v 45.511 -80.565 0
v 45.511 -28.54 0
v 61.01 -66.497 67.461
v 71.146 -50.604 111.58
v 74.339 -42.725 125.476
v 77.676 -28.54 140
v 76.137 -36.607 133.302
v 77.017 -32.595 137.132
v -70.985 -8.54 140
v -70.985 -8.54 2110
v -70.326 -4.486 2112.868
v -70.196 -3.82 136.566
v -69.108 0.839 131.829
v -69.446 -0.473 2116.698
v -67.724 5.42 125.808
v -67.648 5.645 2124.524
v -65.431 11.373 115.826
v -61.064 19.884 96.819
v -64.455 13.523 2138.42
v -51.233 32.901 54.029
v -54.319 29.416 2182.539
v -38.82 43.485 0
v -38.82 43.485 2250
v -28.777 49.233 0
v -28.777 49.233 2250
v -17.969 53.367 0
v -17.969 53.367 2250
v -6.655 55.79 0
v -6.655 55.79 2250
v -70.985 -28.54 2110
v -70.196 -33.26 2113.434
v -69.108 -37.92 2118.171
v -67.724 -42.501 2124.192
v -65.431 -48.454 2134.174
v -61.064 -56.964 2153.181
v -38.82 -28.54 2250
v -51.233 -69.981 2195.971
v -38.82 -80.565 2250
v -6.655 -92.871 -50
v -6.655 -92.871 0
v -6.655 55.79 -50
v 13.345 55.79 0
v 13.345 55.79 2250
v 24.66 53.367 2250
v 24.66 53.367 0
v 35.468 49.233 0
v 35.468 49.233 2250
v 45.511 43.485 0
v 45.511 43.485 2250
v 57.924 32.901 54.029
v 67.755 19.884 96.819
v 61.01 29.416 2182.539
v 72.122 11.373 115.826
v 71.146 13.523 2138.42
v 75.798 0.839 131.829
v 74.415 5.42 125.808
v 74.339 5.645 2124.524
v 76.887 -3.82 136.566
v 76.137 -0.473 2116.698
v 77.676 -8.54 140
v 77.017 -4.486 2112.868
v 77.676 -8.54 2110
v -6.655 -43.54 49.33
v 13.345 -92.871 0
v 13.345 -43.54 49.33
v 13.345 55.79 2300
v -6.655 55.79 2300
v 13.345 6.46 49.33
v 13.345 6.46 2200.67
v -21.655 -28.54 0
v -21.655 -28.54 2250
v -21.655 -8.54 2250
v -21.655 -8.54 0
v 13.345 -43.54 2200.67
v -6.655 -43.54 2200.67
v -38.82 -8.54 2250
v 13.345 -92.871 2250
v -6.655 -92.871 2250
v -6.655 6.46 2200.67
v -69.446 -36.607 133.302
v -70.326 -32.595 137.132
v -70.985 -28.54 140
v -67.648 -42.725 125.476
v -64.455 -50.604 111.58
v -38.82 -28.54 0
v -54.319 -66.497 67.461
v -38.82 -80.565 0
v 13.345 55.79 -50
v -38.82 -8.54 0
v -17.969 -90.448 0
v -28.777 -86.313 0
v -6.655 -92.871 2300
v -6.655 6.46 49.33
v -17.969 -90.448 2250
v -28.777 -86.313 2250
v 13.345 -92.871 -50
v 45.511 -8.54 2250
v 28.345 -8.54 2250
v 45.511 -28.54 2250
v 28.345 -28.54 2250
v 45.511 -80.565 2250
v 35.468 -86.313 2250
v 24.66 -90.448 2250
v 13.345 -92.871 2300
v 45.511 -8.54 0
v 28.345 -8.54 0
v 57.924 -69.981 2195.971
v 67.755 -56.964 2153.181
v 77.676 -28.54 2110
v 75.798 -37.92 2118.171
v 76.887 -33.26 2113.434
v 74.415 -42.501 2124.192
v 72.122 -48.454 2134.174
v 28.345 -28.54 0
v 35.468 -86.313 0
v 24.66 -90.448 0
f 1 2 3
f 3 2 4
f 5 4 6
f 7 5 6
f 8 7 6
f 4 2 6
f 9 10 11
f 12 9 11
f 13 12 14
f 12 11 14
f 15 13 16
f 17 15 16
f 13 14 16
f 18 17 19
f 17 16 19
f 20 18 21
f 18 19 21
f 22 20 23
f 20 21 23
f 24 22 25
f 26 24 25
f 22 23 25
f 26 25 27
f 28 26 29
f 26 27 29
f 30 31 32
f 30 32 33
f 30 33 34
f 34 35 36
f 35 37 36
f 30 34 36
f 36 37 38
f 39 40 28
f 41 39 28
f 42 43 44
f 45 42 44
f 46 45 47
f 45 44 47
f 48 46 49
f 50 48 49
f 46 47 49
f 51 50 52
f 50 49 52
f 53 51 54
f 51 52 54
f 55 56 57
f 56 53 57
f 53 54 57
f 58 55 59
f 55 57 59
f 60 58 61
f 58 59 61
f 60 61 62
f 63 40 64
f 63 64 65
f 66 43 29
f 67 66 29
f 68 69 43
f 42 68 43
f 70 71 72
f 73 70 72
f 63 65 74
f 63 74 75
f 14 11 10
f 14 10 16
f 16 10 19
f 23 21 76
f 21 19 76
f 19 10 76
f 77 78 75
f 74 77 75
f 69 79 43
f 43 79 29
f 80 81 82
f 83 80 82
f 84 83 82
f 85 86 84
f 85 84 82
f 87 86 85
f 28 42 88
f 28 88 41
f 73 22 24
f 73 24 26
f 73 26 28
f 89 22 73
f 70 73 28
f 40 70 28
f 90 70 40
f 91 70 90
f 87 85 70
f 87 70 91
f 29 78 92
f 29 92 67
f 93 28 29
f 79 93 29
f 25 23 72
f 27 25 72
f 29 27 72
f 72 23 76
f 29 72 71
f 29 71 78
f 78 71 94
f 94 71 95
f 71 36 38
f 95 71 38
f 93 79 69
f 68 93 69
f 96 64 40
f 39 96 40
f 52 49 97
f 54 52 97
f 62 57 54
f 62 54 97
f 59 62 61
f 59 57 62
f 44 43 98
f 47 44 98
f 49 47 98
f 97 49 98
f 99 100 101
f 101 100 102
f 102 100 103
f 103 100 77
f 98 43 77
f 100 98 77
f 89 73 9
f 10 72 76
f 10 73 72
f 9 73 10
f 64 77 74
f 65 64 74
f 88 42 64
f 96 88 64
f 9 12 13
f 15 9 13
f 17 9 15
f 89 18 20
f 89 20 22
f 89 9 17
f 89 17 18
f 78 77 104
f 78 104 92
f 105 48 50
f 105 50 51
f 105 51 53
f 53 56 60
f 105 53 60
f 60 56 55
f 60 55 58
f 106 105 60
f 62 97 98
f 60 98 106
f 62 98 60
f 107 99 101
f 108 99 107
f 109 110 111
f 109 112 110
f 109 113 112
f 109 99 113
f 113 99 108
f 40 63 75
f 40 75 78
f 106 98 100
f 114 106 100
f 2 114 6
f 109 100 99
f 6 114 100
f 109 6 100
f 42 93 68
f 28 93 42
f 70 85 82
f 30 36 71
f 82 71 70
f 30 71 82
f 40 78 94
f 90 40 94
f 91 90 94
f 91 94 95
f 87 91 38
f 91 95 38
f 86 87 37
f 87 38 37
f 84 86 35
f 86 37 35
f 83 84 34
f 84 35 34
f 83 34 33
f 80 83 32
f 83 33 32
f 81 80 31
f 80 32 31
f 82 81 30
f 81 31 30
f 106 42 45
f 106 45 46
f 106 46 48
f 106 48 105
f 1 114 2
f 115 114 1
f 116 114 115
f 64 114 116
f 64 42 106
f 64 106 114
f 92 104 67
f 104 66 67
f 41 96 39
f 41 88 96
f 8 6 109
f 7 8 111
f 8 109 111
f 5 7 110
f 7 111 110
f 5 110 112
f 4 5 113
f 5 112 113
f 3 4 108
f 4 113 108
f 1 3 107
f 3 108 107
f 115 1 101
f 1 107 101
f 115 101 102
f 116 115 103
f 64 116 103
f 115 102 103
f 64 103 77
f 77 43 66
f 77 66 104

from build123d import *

# Parameters (mm, degrees)
BOSS_EXTRUDE1_DEPTH = 1125
CUT_EXTRUDE1_DEPTH  = 110
BOSS_EXTRUDE2_DEPTH = 20
SKETCH4_W           = 20
SKETCH4_H           = 74.330343737
SKETCH4_H_2         = 74.330343736
BOSS_EXTRUDE3_DEPTH = 50


with BuildPart() as part:
    # Sketch1 → Boss-Extrude1 (new body)
    with BuildSketch(Plane.XY):
        with BuildLine():
            Line((77.675695624, -8.540198176), (28.345351887, -8.540198176))
            Line((28.345351887, -8.540198176), (28.345351887, -28.540198176))
            Line((28.345351887, -28.540198176), (77.675695624, -28.540198176))
            ThreePointArc((77.675695624, -28.540198176), (56.378360476, -71.573206765), (13.345351887, -92.870541913))
            Line((13.345351887, -92.870541913), (13.345351887, -43.540198176))
            Line((13.345351887, -43.540198176), (-6.654648113, -43.540198176))
            Line((-6.654648113, -43.540198176), (-6.654648113, -92.870541913))
            ThreePointArc((-6.654648113, -92.870541913), (-49.687656702, -71.573206765), (-70.984991849, -28.540198176))
            Line((-70.984991849, -28.540198176), (-21.654648113, -28.540198176))
            Line((-21.654648113, -28.540198176), (-21.654648113, -8.540198176))
            Line((-21.654648113, -8.540198176), (-70.984991849, -8.540198176))
            ThreePointArc((-70.984991849, -8.540198176), (-49.687656702, 34.492810412), (-6.654648113, 55.79014556))
            Line((-6.654648113, 55.79014556), (-6.654648113, 6.459801824))
            Line((-6.654648113, 6.459801824), (13.345351887, 6.459801824))
            Line((13.345351887, 6.459801824), (13.345351887, 55.79014556))
            ThreePointArc((13.345351887, 55.79014556), (56.378360476, 34.492810412), (77.675695624, -8.540198176))
        make_face()
    boss_extrude1 = extrude(amount=BOSS_EXTRUDE1_DEPTH)

    # Sketch2 → Cut-Extrude1 (cut, symmetric)
    with BuildSketch(Plane(origin=(0, 0, 0), x_dir=(1, 0, 0), z_dir=(0, 1, 0))):
        Polygon((-70.984991849, -140), (-38.819819981, 0), (-70.984991849, 0), align=None)
        Polygon((77.675695624, 0), (45.510523755, 0), (77.675695624, -140), align=None)
    cut_extrude1 = extrude(amount=CUT_EXTRUDE1_DEPTH, both=True, mode=Mode.SUBTRACT)

    # Sketch3 → Boss-Extrude2 (add)
    with BuildSketch(Plane(origin=(-6.654648113, 0, 0), x_dir=(0, 0, -1), z_dir=(1, 0, 0))):
        Polygon((0, 55.79014556), (0, -92.870541913), (-74.330343737, -18.540198176), align=None)
    boss_extrude2 = extrude(amount=BOSS_EXTRUDE2_DEPTH)

    # Sketch4 → Boss-Extrude3 (add)
    with BuildSketch(Plane(origin=(0, 0, 0), x_dir=(-1, 0, 0), z_dir=(0, 0, -1))):
        with Locations((-3.345351887, -55.705370045)):
            Rectangle(SKETCH4_W, SKETCH4_H)
        with Locations((-3.345351887, 18.624973692)):
            Rectangle(SKETCH4_W, SKETCH4_H_2)
    boss_extrude3 = extrude(amount=BOSS_EXTRUDE3_DEPTH)

    # Mirror1: Boss-Extrude1, Cut-Extrude1, Boss-Extrude2, Boss-Extrude3 across plane
    add(boss_extrude1.mirror(Plane.XY.offset(1125)))
    add(cut_extrude1.mirror(Plane.XY.offset(1125)), mode=Mode.SUBTRACT)
    add(boss_extrude2.mirror(Plane.XY.offset(1125)))
    add(boss_extrude3.mirror(Plane.XY.offset(1125)))


solid = part.part
